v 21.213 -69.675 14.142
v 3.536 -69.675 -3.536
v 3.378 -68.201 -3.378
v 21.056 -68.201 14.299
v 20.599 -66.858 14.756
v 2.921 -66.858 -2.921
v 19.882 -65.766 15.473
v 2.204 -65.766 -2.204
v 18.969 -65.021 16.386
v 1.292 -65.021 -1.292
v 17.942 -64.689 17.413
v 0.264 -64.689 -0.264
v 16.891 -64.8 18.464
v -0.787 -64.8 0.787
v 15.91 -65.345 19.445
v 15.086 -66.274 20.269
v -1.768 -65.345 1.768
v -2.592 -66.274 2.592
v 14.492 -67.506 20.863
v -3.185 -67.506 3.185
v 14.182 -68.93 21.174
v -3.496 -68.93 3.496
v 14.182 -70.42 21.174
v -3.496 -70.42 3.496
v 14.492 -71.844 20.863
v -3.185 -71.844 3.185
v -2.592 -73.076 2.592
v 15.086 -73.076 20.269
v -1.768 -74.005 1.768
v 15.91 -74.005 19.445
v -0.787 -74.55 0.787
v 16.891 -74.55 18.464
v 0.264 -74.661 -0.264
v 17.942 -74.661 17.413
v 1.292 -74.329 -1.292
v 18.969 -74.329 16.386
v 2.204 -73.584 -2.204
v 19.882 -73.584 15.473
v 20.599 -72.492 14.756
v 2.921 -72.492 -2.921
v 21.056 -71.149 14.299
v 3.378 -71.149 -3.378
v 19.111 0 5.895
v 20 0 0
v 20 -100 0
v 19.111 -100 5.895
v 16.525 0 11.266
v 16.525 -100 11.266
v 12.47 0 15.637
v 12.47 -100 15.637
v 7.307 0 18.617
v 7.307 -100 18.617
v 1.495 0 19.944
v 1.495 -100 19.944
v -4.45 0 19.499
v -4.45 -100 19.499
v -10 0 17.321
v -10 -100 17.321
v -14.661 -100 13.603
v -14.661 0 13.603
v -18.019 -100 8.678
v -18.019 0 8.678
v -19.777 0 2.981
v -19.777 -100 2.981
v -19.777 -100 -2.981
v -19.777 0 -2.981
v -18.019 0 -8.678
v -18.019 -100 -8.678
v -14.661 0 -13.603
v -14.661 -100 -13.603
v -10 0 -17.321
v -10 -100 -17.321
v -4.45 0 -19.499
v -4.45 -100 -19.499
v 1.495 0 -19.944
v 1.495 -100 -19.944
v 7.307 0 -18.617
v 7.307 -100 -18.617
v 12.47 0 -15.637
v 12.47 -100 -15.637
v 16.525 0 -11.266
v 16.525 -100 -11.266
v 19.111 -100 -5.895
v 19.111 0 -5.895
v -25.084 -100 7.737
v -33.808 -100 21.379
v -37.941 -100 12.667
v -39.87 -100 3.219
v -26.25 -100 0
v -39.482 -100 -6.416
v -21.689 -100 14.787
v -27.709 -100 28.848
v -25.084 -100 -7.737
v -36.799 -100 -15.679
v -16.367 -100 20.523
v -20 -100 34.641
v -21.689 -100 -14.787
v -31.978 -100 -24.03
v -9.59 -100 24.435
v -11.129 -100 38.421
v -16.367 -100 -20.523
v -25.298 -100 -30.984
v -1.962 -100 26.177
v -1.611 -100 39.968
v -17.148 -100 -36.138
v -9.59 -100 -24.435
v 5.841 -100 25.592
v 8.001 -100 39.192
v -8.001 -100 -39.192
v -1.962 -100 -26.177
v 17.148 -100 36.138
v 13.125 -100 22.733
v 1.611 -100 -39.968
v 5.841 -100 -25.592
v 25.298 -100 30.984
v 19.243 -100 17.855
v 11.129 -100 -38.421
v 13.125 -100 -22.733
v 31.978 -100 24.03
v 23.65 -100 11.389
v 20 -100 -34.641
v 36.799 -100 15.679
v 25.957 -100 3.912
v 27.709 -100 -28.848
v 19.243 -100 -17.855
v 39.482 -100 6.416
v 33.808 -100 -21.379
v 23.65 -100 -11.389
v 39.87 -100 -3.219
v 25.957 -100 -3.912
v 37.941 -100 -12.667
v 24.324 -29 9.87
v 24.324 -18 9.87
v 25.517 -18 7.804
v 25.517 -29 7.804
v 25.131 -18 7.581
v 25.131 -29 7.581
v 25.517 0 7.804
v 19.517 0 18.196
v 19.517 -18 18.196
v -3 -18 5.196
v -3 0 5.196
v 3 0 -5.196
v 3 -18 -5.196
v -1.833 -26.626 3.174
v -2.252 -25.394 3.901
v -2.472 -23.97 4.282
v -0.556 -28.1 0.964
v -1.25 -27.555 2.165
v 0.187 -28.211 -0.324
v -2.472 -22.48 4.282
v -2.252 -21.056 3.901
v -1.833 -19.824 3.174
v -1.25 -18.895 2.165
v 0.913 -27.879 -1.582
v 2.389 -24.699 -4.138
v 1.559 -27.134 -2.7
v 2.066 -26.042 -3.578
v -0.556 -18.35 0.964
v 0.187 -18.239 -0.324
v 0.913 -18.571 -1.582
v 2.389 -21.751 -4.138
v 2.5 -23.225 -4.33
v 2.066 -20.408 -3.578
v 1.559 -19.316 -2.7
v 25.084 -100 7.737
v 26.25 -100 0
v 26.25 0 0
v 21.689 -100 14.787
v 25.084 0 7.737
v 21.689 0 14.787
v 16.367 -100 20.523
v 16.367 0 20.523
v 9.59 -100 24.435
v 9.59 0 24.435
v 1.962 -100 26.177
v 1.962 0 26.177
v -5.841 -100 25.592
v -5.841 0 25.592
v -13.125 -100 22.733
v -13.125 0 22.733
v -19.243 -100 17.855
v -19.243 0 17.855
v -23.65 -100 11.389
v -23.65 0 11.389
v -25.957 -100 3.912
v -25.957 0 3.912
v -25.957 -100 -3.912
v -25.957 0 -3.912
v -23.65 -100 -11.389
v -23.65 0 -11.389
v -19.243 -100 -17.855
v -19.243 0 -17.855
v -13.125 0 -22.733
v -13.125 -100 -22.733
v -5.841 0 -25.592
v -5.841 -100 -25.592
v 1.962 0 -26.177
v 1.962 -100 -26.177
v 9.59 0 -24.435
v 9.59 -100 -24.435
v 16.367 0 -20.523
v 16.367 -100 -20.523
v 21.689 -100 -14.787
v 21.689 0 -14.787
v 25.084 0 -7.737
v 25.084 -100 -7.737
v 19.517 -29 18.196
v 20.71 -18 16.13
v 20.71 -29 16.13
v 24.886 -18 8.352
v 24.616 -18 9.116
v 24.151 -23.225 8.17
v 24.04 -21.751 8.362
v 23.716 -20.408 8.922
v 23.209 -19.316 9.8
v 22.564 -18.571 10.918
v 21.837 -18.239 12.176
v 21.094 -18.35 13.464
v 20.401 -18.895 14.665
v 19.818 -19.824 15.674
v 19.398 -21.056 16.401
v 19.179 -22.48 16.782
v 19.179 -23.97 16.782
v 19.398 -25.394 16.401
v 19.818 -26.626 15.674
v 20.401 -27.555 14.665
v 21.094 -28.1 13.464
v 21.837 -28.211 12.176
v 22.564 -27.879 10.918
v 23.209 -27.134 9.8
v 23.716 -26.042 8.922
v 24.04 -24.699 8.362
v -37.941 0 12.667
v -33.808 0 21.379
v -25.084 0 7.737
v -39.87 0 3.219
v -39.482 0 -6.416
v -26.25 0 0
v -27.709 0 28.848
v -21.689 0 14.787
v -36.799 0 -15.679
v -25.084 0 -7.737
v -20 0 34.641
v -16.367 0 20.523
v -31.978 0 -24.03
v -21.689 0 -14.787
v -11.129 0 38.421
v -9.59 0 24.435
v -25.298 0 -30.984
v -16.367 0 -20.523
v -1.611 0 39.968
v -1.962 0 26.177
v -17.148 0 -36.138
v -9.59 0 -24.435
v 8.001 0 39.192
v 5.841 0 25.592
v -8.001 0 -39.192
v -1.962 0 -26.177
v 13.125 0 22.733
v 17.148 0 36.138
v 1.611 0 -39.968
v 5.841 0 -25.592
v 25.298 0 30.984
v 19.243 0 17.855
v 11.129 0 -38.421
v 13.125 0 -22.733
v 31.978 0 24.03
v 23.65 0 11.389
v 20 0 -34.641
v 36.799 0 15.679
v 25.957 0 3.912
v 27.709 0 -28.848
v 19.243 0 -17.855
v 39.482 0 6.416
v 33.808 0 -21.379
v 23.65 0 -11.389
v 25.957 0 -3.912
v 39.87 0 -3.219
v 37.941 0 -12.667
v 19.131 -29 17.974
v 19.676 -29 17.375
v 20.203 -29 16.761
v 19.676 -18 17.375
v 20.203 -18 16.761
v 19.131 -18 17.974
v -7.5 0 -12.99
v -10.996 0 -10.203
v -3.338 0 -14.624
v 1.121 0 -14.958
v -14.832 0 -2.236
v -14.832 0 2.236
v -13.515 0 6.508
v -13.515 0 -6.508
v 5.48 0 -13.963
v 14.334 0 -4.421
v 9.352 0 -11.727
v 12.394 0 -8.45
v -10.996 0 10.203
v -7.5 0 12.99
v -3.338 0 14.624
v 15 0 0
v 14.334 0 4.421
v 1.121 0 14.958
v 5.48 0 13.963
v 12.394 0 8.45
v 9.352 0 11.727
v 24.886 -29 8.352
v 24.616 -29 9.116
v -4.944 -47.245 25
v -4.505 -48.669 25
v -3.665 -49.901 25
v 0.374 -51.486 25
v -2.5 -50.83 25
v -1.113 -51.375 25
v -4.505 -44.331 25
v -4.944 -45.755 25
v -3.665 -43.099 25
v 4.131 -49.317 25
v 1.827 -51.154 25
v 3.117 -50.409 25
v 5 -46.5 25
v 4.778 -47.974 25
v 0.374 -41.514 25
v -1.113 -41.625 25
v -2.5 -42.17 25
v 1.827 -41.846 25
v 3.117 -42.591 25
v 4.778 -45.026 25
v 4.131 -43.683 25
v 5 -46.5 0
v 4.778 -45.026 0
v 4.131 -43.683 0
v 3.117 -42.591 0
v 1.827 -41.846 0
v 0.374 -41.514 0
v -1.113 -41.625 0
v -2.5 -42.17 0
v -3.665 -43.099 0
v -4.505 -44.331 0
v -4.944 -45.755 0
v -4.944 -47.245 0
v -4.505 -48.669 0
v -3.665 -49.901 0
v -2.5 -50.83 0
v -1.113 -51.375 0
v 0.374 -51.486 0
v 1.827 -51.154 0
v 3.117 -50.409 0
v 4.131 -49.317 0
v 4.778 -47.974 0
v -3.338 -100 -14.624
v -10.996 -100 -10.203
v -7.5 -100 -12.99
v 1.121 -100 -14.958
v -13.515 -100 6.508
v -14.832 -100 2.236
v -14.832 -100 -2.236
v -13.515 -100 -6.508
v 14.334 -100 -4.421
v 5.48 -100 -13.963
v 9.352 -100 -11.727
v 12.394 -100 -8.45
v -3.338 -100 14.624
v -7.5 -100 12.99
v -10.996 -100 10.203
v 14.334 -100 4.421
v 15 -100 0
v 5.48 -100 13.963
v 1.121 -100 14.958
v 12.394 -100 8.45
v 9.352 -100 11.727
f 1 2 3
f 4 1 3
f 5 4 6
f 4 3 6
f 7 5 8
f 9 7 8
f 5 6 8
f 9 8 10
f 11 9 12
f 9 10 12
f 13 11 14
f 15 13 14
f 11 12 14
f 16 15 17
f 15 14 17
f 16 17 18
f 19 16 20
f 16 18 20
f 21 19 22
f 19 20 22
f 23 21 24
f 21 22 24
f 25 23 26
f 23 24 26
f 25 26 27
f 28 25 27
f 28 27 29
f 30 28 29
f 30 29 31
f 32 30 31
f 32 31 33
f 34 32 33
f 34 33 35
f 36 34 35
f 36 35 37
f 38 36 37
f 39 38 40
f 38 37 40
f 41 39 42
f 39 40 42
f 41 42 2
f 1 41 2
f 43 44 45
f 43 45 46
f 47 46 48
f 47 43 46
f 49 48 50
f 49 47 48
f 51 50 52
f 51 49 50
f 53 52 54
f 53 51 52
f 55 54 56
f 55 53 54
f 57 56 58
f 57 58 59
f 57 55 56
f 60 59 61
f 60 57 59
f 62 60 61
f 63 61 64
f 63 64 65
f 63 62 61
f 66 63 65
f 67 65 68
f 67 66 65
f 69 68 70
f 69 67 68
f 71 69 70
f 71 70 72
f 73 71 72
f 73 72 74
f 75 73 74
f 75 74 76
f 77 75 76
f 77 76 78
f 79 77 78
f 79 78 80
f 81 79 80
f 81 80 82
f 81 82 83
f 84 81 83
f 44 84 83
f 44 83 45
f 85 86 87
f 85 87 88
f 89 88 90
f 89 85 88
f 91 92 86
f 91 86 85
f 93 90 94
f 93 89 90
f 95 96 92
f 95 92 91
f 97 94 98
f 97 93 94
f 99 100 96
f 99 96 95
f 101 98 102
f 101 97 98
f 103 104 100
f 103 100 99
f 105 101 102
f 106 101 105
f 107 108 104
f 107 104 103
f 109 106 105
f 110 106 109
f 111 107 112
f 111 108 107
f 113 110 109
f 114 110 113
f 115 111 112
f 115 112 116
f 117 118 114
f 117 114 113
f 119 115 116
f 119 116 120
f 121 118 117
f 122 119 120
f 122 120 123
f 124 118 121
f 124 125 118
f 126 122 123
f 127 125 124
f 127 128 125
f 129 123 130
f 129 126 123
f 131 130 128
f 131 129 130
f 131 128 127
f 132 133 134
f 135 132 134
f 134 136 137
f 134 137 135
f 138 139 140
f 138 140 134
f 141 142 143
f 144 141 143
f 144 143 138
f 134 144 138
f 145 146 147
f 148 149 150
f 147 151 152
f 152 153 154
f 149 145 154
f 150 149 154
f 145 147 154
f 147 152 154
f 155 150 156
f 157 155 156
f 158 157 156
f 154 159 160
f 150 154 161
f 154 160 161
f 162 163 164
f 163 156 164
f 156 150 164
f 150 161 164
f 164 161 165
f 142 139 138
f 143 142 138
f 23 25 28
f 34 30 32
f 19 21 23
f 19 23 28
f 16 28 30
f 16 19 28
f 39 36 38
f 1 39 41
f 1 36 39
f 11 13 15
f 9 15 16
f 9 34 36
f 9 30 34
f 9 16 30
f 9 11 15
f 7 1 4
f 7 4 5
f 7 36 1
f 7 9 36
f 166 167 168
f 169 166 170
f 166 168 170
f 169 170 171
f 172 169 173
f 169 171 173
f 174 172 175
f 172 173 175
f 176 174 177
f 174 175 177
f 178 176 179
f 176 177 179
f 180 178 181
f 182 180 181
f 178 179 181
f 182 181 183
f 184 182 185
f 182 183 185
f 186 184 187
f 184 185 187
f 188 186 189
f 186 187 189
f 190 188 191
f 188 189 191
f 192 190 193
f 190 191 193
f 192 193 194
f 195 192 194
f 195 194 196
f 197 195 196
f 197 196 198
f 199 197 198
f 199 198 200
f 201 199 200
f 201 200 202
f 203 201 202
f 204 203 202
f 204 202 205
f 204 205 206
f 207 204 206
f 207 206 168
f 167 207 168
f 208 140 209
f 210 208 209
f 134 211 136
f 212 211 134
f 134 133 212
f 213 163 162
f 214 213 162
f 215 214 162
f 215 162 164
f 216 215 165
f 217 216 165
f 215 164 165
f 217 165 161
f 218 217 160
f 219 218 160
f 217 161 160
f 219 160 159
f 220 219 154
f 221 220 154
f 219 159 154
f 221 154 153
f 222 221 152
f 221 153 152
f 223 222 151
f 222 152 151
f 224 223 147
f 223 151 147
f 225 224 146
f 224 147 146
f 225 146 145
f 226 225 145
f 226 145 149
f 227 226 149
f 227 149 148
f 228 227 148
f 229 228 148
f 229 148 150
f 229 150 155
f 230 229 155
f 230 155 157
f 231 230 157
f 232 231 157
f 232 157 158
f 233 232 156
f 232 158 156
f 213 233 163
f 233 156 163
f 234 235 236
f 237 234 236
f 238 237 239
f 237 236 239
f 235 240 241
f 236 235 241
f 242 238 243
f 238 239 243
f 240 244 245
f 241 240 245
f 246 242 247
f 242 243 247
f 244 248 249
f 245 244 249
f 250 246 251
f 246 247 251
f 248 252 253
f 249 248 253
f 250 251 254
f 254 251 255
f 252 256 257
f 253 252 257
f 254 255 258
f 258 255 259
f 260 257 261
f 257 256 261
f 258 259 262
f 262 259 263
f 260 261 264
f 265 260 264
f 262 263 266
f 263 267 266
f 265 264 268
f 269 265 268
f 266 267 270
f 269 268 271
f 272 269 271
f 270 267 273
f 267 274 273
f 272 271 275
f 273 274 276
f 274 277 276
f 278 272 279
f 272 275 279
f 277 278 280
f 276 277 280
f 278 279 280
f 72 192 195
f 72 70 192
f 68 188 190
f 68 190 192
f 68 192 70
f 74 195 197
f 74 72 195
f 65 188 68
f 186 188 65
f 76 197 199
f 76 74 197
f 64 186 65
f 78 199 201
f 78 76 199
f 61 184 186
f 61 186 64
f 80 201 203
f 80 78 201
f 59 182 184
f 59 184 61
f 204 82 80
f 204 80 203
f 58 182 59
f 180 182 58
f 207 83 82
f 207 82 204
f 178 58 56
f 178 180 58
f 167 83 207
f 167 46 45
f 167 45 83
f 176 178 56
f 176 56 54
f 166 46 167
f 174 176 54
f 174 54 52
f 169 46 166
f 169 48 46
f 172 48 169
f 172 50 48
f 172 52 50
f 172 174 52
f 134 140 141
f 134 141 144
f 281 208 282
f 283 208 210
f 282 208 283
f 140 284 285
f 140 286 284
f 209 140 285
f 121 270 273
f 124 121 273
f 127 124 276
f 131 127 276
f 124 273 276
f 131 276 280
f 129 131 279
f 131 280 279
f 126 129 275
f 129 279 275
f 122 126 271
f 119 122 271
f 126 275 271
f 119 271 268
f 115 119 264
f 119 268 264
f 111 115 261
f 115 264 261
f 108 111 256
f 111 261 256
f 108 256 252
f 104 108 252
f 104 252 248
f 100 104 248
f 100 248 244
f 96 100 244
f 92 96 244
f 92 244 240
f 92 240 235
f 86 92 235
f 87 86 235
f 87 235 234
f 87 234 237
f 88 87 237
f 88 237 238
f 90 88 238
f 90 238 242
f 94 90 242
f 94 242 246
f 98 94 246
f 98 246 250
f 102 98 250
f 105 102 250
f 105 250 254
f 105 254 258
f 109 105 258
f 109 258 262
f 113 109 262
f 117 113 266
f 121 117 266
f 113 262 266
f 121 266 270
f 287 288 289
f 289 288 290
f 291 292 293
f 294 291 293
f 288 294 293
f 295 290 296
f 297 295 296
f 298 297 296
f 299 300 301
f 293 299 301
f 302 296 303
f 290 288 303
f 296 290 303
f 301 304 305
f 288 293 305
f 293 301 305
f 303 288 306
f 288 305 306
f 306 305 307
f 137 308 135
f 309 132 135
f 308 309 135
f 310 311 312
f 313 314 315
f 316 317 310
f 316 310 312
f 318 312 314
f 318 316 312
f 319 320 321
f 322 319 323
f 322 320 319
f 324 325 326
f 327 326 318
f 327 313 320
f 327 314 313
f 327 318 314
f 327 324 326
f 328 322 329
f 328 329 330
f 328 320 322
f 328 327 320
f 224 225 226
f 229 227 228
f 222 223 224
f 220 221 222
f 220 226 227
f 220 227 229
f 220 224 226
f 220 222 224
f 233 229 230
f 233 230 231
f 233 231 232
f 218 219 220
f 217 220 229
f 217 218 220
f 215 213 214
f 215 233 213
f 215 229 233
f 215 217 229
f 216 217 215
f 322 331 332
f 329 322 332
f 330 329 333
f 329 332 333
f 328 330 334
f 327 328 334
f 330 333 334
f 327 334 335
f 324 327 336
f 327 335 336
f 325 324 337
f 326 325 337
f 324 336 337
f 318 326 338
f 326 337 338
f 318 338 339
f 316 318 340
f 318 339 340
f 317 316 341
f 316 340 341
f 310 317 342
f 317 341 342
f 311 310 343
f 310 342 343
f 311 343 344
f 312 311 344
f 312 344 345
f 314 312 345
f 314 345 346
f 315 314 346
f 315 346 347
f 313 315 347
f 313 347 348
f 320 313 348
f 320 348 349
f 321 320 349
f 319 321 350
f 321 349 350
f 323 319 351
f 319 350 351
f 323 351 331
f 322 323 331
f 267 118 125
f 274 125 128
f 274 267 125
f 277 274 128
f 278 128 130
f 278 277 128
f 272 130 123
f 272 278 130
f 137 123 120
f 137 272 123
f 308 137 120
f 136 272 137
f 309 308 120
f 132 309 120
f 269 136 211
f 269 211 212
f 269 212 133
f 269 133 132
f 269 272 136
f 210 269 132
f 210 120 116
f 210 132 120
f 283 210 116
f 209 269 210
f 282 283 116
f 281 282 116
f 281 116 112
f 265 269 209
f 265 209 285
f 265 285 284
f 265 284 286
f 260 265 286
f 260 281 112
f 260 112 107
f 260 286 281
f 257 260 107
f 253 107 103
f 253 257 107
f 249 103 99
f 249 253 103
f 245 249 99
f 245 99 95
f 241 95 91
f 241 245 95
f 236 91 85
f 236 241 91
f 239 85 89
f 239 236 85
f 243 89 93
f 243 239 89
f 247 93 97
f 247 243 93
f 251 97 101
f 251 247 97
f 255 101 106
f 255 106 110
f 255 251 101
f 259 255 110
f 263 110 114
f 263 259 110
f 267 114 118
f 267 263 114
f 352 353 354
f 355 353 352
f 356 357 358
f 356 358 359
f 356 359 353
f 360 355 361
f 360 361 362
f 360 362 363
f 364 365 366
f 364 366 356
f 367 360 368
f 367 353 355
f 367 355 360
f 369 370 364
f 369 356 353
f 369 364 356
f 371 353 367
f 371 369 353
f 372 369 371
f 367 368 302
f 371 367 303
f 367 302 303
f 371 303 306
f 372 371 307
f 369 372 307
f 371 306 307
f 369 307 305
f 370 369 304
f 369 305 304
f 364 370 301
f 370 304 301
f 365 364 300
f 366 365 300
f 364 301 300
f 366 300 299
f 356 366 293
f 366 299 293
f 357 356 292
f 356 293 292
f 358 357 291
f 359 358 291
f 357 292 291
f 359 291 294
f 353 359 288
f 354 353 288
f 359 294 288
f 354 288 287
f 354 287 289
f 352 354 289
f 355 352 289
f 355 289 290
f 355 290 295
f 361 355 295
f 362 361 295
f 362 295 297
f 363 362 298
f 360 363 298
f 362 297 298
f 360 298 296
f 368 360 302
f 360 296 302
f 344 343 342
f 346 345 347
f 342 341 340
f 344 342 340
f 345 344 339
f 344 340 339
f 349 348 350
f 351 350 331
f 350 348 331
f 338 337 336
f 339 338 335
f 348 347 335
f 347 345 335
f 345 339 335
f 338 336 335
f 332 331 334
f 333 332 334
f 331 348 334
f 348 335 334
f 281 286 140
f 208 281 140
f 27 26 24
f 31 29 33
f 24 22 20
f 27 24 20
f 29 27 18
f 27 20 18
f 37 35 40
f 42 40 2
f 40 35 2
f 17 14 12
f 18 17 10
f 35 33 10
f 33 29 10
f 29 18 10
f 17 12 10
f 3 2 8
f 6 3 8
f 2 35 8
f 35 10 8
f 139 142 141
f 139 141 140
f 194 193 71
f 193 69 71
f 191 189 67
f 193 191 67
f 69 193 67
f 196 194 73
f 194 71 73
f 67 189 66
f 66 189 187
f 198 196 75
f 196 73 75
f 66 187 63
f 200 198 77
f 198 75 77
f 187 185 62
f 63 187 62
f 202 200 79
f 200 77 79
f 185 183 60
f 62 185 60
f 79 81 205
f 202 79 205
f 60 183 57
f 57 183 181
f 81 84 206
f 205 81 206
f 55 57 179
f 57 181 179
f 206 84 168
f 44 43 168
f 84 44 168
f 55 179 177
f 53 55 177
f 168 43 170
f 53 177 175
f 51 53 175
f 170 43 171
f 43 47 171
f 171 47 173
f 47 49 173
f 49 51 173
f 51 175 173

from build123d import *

# Parameters (mm, degrees)
F0_R      = 15
F1_DEPTH  = 100
F2_R      = 5
F3_DEPTH  = 25
F4_ANGLE  = 60
F5_R      = 5
F6_DEPTH  = 25
F7_R      = 5
F8_DEPTH  = 25
F9_ANGLE  = 45
F10_R     = 40
F10_R_2   = 26.25
F11_DEPTH = 100
F12_W     = 12
F12_H     = 26
F13_DEPTH = 29
F14_ANGLE = 60
F15_DEPTH = 18
F16_ANGLE = -60
F17_DEPTH = 18
F10_R_3   = 20
F18_DEPTH = 100
F19_DEPTH = 60.6


with BuildPart() as f1:
    # F0 (on Front) → F1 (new body)
    with BuildSketch(Plane.XZ):
        Circle(F0_R)
    extrude(amount=F1_DEPTH)


with BuildPart() as f3:
    # F2 (on Top) → F3 (new body)
    with BuildSketch(Plane.XY):
        with Locations((0, -23.225)):
            Circle(F2_R)
    extrude(amount=F3_DEPTH)


with BuildPart() as f3_1:
    # F4: moved
    add(f3.part.rotate(Axis((0, 0, 0), (0, 1, 0)), F4_ANGLE))


with BuildPart() as f6:
    # F5 (on Top) → F6 (new body)
    with BuildSketch(Plane.XY):
        with Locations((0, -46.5)):
            Circle(F5_R)
    extrude(amount=F6_DEPTH)


with BuildPart() as f8:
    # F7 (on Top) → F8 (new body)
    with BuildSketch(Plane.XY):
        with Locations((0, -69.675)):
            Circle(F7_R)
    extrude(amount=F8_DEPTH)


with BuildPart() as f8_1:
    # F9: moved
    add(f8.part.rotate(Axis((0, 0, 0), (0, 1, 0)), F9_ANGLE))


with BuildPart() as f11:
    # F10 (on Front) → F11 (new body)
    with BuildSketch(Plane.XZ):
        Circle(F10_R)
        Circle(F10_R_2, mode=Mode.SUBTRACT)
    extrude(amount=F11_DEPTH)

    # F12 (on Front) → F13 (cut)
    with BuildSketch(Plane.XZ):
        with Locations((0, 13)):
            Rectangle(F12_W, F12_H)
    extrude(amount=F13_DEPTH, mode=Mode.SUBTRACT)


with BuildPart() as f11_1:
    # F14: moved
    add(f11.part.rotate(Axis((0, 0, 0), (0, 1, 0)), F14_ANGLE))

    # F10 (on Front) → F17 (join)
    with BuildSketch(Plane.XZ):
        Circle(F10_R)
        Circle(F10_R_2, mode=Mode.SUBTRACT)
    extrude(amount=F17_DEPTH)


with BuildPart() as f15:
    # F12 (on Front) → F15 (new body)
    with BuildSketch(Plane.XZ):
        with Locations((0, 13)):
            Rectangle(F12_W, F12_H)
    extrude(amount=F15_DEPTH)


with BuildPart() as f15_1:
    # F16: moved
    add(f15.part.rotate(Axis((0, 0, 0), (0, -1, 0)), F16_ANGLE))


with BuildPart() as f18:
    # F10 (on Front) → F18 (new body)
    with BuildSketch(Plane.XZ):
        Circle(F10_R_2)
        Circle(F10_R_3, mode=Mode.SUBTRACT)
    extrude(amount=F18_DEPTH)

    # F19 (add): a face of the model
    f19_faces = [f18.faces().sort_by_distance(p)[0] for p in [
        (-25.5075378798, 0, 0),
    ]]
    extrude(f19_faces, amount=-F19_DEPTH)


solid = Compound([f1.part, f3_1.part, f6.part, f8_1.part, f11_1.part, f15_1.part, f18.part])
